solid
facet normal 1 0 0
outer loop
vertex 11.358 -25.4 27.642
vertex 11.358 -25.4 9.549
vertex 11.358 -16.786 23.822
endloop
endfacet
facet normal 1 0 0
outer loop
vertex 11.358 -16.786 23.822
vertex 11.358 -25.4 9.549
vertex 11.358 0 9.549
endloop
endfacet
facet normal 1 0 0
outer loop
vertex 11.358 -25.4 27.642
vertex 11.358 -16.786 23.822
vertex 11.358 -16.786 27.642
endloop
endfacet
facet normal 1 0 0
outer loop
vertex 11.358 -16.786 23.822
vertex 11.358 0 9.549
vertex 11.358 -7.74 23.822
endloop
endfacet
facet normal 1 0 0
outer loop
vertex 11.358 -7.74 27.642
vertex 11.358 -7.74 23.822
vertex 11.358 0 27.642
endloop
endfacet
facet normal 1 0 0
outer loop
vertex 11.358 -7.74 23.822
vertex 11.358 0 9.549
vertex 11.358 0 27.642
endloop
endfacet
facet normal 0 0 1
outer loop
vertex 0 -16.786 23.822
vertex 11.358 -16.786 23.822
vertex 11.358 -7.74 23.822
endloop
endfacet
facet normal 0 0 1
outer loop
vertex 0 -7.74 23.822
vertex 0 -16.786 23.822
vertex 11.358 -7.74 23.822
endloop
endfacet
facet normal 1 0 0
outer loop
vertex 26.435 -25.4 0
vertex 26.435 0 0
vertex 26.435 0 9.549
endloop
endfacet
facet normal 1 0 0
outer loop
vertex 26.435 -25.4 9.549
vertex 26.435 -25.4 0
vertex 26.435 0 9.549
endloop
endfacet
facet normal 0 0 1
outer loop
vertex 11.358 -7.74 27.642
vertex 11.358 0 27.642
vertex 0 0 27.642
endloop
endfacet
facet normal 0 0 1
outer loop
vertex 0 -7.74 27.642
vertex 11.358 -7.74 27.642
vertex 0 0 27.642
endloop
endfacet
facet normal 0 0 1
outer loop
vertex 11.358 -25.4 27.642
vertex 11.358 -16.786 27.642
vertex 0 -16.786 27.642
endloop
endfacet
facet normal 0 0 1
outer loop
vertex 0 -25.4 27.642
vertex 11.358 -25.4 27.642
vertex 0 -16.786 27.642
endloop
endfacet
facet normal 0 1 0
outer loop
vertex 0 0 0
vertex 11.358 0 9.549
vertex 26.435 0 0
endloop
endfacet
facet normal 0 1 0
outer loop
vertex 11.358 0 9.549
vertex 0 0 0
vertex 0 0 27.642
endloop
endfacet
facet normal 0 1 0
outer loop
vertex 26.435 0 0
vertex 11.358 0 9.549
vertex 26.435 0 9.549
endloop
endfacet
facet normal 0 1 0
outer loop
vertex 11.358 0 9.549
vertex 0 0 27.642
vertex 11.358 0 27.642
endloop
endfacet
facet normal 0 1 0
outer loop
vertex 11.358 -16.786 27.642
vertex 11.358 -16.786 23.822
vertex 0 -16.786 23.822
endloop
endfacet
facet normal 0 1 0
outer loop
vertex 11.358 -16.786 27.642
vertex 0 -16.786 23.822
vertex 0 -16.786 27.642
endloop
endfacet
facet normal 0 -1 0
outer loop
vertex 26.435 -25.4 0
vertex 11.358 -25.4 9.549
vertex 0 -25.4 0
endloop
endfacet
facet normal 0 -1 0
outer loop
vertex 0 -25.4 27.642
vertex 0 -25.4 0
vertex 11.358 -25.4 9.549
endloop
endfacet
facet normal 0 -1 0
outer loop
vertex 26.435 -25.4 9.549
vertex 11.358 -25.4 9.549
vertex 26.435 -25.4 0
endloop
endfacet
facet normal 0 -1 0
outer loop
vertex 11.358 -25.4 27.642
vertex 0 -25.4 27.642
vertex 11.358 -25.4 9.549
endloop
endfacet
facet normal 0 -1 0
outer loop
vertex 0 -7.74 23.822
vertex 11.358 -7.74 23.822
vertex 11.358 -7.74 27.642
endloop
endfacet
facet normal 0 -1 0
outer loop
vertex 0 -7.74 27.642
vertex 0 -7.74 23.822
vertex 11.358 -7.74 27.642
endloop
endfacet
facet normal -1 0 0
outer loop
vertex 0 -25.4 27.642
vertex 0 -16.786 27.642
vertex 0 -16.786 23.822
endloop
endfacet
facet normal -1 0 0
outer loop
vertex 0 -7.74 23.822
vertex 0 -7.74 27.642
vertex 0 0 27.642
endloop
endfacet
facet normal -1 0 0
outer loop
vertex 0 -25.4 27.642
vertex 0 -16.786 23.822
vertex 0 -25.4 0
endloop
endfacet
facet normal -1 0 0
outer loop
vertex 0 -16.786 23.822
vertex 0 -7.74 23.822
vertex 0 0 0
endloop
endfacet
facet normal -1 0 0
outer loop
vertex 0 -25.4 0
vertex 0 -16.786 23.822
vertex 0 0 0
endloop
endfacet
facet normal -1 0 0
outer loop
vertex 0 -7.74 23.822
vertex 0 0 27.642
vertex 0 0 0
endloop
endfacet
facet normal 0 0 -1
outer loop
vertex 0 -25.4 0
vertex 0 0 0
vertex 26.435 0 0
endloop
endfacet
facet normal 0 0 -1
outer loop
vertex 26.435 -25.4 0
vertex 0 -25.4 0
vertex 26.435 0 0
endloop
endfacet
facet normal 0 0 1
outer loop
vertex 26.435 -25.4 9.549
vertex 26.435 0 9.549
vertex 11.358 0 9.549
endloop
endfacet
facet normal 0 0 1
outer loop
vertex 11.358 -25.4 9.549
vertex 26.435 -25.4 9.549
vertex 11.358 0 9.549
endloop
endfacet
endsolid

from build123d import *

# Parameters (mm, degrees)
F1_DEPTH = 25.4
F2_W     = 9.046357
F2_H     = 3.819572
F3_DEPTH = 25.4


with BuildPart() as f1:
    # F0 (on Front) → F1 (new body)
    with BuildSketch(Plane.XZ):
        Polygon((0, 27.641645), (0, 0), (26.435465, 0), (26.435465, 9.548932), (11.358204, 9.548932), (11.358204, 27.641645), align=None)
    extrude(amount=F1_DEPTH)

    # F2 (on face) → F3 (cut)
    with BuildSketch(Plane.YZ.offset(11.358204)):
        with Locations((-12.262839, 25.731859)):
            Rectangle(F2_W, F2_H)
    extrude(amount=-F3_DEPTH, mode=Mode.SUBTRACT)


solid = f1.part
